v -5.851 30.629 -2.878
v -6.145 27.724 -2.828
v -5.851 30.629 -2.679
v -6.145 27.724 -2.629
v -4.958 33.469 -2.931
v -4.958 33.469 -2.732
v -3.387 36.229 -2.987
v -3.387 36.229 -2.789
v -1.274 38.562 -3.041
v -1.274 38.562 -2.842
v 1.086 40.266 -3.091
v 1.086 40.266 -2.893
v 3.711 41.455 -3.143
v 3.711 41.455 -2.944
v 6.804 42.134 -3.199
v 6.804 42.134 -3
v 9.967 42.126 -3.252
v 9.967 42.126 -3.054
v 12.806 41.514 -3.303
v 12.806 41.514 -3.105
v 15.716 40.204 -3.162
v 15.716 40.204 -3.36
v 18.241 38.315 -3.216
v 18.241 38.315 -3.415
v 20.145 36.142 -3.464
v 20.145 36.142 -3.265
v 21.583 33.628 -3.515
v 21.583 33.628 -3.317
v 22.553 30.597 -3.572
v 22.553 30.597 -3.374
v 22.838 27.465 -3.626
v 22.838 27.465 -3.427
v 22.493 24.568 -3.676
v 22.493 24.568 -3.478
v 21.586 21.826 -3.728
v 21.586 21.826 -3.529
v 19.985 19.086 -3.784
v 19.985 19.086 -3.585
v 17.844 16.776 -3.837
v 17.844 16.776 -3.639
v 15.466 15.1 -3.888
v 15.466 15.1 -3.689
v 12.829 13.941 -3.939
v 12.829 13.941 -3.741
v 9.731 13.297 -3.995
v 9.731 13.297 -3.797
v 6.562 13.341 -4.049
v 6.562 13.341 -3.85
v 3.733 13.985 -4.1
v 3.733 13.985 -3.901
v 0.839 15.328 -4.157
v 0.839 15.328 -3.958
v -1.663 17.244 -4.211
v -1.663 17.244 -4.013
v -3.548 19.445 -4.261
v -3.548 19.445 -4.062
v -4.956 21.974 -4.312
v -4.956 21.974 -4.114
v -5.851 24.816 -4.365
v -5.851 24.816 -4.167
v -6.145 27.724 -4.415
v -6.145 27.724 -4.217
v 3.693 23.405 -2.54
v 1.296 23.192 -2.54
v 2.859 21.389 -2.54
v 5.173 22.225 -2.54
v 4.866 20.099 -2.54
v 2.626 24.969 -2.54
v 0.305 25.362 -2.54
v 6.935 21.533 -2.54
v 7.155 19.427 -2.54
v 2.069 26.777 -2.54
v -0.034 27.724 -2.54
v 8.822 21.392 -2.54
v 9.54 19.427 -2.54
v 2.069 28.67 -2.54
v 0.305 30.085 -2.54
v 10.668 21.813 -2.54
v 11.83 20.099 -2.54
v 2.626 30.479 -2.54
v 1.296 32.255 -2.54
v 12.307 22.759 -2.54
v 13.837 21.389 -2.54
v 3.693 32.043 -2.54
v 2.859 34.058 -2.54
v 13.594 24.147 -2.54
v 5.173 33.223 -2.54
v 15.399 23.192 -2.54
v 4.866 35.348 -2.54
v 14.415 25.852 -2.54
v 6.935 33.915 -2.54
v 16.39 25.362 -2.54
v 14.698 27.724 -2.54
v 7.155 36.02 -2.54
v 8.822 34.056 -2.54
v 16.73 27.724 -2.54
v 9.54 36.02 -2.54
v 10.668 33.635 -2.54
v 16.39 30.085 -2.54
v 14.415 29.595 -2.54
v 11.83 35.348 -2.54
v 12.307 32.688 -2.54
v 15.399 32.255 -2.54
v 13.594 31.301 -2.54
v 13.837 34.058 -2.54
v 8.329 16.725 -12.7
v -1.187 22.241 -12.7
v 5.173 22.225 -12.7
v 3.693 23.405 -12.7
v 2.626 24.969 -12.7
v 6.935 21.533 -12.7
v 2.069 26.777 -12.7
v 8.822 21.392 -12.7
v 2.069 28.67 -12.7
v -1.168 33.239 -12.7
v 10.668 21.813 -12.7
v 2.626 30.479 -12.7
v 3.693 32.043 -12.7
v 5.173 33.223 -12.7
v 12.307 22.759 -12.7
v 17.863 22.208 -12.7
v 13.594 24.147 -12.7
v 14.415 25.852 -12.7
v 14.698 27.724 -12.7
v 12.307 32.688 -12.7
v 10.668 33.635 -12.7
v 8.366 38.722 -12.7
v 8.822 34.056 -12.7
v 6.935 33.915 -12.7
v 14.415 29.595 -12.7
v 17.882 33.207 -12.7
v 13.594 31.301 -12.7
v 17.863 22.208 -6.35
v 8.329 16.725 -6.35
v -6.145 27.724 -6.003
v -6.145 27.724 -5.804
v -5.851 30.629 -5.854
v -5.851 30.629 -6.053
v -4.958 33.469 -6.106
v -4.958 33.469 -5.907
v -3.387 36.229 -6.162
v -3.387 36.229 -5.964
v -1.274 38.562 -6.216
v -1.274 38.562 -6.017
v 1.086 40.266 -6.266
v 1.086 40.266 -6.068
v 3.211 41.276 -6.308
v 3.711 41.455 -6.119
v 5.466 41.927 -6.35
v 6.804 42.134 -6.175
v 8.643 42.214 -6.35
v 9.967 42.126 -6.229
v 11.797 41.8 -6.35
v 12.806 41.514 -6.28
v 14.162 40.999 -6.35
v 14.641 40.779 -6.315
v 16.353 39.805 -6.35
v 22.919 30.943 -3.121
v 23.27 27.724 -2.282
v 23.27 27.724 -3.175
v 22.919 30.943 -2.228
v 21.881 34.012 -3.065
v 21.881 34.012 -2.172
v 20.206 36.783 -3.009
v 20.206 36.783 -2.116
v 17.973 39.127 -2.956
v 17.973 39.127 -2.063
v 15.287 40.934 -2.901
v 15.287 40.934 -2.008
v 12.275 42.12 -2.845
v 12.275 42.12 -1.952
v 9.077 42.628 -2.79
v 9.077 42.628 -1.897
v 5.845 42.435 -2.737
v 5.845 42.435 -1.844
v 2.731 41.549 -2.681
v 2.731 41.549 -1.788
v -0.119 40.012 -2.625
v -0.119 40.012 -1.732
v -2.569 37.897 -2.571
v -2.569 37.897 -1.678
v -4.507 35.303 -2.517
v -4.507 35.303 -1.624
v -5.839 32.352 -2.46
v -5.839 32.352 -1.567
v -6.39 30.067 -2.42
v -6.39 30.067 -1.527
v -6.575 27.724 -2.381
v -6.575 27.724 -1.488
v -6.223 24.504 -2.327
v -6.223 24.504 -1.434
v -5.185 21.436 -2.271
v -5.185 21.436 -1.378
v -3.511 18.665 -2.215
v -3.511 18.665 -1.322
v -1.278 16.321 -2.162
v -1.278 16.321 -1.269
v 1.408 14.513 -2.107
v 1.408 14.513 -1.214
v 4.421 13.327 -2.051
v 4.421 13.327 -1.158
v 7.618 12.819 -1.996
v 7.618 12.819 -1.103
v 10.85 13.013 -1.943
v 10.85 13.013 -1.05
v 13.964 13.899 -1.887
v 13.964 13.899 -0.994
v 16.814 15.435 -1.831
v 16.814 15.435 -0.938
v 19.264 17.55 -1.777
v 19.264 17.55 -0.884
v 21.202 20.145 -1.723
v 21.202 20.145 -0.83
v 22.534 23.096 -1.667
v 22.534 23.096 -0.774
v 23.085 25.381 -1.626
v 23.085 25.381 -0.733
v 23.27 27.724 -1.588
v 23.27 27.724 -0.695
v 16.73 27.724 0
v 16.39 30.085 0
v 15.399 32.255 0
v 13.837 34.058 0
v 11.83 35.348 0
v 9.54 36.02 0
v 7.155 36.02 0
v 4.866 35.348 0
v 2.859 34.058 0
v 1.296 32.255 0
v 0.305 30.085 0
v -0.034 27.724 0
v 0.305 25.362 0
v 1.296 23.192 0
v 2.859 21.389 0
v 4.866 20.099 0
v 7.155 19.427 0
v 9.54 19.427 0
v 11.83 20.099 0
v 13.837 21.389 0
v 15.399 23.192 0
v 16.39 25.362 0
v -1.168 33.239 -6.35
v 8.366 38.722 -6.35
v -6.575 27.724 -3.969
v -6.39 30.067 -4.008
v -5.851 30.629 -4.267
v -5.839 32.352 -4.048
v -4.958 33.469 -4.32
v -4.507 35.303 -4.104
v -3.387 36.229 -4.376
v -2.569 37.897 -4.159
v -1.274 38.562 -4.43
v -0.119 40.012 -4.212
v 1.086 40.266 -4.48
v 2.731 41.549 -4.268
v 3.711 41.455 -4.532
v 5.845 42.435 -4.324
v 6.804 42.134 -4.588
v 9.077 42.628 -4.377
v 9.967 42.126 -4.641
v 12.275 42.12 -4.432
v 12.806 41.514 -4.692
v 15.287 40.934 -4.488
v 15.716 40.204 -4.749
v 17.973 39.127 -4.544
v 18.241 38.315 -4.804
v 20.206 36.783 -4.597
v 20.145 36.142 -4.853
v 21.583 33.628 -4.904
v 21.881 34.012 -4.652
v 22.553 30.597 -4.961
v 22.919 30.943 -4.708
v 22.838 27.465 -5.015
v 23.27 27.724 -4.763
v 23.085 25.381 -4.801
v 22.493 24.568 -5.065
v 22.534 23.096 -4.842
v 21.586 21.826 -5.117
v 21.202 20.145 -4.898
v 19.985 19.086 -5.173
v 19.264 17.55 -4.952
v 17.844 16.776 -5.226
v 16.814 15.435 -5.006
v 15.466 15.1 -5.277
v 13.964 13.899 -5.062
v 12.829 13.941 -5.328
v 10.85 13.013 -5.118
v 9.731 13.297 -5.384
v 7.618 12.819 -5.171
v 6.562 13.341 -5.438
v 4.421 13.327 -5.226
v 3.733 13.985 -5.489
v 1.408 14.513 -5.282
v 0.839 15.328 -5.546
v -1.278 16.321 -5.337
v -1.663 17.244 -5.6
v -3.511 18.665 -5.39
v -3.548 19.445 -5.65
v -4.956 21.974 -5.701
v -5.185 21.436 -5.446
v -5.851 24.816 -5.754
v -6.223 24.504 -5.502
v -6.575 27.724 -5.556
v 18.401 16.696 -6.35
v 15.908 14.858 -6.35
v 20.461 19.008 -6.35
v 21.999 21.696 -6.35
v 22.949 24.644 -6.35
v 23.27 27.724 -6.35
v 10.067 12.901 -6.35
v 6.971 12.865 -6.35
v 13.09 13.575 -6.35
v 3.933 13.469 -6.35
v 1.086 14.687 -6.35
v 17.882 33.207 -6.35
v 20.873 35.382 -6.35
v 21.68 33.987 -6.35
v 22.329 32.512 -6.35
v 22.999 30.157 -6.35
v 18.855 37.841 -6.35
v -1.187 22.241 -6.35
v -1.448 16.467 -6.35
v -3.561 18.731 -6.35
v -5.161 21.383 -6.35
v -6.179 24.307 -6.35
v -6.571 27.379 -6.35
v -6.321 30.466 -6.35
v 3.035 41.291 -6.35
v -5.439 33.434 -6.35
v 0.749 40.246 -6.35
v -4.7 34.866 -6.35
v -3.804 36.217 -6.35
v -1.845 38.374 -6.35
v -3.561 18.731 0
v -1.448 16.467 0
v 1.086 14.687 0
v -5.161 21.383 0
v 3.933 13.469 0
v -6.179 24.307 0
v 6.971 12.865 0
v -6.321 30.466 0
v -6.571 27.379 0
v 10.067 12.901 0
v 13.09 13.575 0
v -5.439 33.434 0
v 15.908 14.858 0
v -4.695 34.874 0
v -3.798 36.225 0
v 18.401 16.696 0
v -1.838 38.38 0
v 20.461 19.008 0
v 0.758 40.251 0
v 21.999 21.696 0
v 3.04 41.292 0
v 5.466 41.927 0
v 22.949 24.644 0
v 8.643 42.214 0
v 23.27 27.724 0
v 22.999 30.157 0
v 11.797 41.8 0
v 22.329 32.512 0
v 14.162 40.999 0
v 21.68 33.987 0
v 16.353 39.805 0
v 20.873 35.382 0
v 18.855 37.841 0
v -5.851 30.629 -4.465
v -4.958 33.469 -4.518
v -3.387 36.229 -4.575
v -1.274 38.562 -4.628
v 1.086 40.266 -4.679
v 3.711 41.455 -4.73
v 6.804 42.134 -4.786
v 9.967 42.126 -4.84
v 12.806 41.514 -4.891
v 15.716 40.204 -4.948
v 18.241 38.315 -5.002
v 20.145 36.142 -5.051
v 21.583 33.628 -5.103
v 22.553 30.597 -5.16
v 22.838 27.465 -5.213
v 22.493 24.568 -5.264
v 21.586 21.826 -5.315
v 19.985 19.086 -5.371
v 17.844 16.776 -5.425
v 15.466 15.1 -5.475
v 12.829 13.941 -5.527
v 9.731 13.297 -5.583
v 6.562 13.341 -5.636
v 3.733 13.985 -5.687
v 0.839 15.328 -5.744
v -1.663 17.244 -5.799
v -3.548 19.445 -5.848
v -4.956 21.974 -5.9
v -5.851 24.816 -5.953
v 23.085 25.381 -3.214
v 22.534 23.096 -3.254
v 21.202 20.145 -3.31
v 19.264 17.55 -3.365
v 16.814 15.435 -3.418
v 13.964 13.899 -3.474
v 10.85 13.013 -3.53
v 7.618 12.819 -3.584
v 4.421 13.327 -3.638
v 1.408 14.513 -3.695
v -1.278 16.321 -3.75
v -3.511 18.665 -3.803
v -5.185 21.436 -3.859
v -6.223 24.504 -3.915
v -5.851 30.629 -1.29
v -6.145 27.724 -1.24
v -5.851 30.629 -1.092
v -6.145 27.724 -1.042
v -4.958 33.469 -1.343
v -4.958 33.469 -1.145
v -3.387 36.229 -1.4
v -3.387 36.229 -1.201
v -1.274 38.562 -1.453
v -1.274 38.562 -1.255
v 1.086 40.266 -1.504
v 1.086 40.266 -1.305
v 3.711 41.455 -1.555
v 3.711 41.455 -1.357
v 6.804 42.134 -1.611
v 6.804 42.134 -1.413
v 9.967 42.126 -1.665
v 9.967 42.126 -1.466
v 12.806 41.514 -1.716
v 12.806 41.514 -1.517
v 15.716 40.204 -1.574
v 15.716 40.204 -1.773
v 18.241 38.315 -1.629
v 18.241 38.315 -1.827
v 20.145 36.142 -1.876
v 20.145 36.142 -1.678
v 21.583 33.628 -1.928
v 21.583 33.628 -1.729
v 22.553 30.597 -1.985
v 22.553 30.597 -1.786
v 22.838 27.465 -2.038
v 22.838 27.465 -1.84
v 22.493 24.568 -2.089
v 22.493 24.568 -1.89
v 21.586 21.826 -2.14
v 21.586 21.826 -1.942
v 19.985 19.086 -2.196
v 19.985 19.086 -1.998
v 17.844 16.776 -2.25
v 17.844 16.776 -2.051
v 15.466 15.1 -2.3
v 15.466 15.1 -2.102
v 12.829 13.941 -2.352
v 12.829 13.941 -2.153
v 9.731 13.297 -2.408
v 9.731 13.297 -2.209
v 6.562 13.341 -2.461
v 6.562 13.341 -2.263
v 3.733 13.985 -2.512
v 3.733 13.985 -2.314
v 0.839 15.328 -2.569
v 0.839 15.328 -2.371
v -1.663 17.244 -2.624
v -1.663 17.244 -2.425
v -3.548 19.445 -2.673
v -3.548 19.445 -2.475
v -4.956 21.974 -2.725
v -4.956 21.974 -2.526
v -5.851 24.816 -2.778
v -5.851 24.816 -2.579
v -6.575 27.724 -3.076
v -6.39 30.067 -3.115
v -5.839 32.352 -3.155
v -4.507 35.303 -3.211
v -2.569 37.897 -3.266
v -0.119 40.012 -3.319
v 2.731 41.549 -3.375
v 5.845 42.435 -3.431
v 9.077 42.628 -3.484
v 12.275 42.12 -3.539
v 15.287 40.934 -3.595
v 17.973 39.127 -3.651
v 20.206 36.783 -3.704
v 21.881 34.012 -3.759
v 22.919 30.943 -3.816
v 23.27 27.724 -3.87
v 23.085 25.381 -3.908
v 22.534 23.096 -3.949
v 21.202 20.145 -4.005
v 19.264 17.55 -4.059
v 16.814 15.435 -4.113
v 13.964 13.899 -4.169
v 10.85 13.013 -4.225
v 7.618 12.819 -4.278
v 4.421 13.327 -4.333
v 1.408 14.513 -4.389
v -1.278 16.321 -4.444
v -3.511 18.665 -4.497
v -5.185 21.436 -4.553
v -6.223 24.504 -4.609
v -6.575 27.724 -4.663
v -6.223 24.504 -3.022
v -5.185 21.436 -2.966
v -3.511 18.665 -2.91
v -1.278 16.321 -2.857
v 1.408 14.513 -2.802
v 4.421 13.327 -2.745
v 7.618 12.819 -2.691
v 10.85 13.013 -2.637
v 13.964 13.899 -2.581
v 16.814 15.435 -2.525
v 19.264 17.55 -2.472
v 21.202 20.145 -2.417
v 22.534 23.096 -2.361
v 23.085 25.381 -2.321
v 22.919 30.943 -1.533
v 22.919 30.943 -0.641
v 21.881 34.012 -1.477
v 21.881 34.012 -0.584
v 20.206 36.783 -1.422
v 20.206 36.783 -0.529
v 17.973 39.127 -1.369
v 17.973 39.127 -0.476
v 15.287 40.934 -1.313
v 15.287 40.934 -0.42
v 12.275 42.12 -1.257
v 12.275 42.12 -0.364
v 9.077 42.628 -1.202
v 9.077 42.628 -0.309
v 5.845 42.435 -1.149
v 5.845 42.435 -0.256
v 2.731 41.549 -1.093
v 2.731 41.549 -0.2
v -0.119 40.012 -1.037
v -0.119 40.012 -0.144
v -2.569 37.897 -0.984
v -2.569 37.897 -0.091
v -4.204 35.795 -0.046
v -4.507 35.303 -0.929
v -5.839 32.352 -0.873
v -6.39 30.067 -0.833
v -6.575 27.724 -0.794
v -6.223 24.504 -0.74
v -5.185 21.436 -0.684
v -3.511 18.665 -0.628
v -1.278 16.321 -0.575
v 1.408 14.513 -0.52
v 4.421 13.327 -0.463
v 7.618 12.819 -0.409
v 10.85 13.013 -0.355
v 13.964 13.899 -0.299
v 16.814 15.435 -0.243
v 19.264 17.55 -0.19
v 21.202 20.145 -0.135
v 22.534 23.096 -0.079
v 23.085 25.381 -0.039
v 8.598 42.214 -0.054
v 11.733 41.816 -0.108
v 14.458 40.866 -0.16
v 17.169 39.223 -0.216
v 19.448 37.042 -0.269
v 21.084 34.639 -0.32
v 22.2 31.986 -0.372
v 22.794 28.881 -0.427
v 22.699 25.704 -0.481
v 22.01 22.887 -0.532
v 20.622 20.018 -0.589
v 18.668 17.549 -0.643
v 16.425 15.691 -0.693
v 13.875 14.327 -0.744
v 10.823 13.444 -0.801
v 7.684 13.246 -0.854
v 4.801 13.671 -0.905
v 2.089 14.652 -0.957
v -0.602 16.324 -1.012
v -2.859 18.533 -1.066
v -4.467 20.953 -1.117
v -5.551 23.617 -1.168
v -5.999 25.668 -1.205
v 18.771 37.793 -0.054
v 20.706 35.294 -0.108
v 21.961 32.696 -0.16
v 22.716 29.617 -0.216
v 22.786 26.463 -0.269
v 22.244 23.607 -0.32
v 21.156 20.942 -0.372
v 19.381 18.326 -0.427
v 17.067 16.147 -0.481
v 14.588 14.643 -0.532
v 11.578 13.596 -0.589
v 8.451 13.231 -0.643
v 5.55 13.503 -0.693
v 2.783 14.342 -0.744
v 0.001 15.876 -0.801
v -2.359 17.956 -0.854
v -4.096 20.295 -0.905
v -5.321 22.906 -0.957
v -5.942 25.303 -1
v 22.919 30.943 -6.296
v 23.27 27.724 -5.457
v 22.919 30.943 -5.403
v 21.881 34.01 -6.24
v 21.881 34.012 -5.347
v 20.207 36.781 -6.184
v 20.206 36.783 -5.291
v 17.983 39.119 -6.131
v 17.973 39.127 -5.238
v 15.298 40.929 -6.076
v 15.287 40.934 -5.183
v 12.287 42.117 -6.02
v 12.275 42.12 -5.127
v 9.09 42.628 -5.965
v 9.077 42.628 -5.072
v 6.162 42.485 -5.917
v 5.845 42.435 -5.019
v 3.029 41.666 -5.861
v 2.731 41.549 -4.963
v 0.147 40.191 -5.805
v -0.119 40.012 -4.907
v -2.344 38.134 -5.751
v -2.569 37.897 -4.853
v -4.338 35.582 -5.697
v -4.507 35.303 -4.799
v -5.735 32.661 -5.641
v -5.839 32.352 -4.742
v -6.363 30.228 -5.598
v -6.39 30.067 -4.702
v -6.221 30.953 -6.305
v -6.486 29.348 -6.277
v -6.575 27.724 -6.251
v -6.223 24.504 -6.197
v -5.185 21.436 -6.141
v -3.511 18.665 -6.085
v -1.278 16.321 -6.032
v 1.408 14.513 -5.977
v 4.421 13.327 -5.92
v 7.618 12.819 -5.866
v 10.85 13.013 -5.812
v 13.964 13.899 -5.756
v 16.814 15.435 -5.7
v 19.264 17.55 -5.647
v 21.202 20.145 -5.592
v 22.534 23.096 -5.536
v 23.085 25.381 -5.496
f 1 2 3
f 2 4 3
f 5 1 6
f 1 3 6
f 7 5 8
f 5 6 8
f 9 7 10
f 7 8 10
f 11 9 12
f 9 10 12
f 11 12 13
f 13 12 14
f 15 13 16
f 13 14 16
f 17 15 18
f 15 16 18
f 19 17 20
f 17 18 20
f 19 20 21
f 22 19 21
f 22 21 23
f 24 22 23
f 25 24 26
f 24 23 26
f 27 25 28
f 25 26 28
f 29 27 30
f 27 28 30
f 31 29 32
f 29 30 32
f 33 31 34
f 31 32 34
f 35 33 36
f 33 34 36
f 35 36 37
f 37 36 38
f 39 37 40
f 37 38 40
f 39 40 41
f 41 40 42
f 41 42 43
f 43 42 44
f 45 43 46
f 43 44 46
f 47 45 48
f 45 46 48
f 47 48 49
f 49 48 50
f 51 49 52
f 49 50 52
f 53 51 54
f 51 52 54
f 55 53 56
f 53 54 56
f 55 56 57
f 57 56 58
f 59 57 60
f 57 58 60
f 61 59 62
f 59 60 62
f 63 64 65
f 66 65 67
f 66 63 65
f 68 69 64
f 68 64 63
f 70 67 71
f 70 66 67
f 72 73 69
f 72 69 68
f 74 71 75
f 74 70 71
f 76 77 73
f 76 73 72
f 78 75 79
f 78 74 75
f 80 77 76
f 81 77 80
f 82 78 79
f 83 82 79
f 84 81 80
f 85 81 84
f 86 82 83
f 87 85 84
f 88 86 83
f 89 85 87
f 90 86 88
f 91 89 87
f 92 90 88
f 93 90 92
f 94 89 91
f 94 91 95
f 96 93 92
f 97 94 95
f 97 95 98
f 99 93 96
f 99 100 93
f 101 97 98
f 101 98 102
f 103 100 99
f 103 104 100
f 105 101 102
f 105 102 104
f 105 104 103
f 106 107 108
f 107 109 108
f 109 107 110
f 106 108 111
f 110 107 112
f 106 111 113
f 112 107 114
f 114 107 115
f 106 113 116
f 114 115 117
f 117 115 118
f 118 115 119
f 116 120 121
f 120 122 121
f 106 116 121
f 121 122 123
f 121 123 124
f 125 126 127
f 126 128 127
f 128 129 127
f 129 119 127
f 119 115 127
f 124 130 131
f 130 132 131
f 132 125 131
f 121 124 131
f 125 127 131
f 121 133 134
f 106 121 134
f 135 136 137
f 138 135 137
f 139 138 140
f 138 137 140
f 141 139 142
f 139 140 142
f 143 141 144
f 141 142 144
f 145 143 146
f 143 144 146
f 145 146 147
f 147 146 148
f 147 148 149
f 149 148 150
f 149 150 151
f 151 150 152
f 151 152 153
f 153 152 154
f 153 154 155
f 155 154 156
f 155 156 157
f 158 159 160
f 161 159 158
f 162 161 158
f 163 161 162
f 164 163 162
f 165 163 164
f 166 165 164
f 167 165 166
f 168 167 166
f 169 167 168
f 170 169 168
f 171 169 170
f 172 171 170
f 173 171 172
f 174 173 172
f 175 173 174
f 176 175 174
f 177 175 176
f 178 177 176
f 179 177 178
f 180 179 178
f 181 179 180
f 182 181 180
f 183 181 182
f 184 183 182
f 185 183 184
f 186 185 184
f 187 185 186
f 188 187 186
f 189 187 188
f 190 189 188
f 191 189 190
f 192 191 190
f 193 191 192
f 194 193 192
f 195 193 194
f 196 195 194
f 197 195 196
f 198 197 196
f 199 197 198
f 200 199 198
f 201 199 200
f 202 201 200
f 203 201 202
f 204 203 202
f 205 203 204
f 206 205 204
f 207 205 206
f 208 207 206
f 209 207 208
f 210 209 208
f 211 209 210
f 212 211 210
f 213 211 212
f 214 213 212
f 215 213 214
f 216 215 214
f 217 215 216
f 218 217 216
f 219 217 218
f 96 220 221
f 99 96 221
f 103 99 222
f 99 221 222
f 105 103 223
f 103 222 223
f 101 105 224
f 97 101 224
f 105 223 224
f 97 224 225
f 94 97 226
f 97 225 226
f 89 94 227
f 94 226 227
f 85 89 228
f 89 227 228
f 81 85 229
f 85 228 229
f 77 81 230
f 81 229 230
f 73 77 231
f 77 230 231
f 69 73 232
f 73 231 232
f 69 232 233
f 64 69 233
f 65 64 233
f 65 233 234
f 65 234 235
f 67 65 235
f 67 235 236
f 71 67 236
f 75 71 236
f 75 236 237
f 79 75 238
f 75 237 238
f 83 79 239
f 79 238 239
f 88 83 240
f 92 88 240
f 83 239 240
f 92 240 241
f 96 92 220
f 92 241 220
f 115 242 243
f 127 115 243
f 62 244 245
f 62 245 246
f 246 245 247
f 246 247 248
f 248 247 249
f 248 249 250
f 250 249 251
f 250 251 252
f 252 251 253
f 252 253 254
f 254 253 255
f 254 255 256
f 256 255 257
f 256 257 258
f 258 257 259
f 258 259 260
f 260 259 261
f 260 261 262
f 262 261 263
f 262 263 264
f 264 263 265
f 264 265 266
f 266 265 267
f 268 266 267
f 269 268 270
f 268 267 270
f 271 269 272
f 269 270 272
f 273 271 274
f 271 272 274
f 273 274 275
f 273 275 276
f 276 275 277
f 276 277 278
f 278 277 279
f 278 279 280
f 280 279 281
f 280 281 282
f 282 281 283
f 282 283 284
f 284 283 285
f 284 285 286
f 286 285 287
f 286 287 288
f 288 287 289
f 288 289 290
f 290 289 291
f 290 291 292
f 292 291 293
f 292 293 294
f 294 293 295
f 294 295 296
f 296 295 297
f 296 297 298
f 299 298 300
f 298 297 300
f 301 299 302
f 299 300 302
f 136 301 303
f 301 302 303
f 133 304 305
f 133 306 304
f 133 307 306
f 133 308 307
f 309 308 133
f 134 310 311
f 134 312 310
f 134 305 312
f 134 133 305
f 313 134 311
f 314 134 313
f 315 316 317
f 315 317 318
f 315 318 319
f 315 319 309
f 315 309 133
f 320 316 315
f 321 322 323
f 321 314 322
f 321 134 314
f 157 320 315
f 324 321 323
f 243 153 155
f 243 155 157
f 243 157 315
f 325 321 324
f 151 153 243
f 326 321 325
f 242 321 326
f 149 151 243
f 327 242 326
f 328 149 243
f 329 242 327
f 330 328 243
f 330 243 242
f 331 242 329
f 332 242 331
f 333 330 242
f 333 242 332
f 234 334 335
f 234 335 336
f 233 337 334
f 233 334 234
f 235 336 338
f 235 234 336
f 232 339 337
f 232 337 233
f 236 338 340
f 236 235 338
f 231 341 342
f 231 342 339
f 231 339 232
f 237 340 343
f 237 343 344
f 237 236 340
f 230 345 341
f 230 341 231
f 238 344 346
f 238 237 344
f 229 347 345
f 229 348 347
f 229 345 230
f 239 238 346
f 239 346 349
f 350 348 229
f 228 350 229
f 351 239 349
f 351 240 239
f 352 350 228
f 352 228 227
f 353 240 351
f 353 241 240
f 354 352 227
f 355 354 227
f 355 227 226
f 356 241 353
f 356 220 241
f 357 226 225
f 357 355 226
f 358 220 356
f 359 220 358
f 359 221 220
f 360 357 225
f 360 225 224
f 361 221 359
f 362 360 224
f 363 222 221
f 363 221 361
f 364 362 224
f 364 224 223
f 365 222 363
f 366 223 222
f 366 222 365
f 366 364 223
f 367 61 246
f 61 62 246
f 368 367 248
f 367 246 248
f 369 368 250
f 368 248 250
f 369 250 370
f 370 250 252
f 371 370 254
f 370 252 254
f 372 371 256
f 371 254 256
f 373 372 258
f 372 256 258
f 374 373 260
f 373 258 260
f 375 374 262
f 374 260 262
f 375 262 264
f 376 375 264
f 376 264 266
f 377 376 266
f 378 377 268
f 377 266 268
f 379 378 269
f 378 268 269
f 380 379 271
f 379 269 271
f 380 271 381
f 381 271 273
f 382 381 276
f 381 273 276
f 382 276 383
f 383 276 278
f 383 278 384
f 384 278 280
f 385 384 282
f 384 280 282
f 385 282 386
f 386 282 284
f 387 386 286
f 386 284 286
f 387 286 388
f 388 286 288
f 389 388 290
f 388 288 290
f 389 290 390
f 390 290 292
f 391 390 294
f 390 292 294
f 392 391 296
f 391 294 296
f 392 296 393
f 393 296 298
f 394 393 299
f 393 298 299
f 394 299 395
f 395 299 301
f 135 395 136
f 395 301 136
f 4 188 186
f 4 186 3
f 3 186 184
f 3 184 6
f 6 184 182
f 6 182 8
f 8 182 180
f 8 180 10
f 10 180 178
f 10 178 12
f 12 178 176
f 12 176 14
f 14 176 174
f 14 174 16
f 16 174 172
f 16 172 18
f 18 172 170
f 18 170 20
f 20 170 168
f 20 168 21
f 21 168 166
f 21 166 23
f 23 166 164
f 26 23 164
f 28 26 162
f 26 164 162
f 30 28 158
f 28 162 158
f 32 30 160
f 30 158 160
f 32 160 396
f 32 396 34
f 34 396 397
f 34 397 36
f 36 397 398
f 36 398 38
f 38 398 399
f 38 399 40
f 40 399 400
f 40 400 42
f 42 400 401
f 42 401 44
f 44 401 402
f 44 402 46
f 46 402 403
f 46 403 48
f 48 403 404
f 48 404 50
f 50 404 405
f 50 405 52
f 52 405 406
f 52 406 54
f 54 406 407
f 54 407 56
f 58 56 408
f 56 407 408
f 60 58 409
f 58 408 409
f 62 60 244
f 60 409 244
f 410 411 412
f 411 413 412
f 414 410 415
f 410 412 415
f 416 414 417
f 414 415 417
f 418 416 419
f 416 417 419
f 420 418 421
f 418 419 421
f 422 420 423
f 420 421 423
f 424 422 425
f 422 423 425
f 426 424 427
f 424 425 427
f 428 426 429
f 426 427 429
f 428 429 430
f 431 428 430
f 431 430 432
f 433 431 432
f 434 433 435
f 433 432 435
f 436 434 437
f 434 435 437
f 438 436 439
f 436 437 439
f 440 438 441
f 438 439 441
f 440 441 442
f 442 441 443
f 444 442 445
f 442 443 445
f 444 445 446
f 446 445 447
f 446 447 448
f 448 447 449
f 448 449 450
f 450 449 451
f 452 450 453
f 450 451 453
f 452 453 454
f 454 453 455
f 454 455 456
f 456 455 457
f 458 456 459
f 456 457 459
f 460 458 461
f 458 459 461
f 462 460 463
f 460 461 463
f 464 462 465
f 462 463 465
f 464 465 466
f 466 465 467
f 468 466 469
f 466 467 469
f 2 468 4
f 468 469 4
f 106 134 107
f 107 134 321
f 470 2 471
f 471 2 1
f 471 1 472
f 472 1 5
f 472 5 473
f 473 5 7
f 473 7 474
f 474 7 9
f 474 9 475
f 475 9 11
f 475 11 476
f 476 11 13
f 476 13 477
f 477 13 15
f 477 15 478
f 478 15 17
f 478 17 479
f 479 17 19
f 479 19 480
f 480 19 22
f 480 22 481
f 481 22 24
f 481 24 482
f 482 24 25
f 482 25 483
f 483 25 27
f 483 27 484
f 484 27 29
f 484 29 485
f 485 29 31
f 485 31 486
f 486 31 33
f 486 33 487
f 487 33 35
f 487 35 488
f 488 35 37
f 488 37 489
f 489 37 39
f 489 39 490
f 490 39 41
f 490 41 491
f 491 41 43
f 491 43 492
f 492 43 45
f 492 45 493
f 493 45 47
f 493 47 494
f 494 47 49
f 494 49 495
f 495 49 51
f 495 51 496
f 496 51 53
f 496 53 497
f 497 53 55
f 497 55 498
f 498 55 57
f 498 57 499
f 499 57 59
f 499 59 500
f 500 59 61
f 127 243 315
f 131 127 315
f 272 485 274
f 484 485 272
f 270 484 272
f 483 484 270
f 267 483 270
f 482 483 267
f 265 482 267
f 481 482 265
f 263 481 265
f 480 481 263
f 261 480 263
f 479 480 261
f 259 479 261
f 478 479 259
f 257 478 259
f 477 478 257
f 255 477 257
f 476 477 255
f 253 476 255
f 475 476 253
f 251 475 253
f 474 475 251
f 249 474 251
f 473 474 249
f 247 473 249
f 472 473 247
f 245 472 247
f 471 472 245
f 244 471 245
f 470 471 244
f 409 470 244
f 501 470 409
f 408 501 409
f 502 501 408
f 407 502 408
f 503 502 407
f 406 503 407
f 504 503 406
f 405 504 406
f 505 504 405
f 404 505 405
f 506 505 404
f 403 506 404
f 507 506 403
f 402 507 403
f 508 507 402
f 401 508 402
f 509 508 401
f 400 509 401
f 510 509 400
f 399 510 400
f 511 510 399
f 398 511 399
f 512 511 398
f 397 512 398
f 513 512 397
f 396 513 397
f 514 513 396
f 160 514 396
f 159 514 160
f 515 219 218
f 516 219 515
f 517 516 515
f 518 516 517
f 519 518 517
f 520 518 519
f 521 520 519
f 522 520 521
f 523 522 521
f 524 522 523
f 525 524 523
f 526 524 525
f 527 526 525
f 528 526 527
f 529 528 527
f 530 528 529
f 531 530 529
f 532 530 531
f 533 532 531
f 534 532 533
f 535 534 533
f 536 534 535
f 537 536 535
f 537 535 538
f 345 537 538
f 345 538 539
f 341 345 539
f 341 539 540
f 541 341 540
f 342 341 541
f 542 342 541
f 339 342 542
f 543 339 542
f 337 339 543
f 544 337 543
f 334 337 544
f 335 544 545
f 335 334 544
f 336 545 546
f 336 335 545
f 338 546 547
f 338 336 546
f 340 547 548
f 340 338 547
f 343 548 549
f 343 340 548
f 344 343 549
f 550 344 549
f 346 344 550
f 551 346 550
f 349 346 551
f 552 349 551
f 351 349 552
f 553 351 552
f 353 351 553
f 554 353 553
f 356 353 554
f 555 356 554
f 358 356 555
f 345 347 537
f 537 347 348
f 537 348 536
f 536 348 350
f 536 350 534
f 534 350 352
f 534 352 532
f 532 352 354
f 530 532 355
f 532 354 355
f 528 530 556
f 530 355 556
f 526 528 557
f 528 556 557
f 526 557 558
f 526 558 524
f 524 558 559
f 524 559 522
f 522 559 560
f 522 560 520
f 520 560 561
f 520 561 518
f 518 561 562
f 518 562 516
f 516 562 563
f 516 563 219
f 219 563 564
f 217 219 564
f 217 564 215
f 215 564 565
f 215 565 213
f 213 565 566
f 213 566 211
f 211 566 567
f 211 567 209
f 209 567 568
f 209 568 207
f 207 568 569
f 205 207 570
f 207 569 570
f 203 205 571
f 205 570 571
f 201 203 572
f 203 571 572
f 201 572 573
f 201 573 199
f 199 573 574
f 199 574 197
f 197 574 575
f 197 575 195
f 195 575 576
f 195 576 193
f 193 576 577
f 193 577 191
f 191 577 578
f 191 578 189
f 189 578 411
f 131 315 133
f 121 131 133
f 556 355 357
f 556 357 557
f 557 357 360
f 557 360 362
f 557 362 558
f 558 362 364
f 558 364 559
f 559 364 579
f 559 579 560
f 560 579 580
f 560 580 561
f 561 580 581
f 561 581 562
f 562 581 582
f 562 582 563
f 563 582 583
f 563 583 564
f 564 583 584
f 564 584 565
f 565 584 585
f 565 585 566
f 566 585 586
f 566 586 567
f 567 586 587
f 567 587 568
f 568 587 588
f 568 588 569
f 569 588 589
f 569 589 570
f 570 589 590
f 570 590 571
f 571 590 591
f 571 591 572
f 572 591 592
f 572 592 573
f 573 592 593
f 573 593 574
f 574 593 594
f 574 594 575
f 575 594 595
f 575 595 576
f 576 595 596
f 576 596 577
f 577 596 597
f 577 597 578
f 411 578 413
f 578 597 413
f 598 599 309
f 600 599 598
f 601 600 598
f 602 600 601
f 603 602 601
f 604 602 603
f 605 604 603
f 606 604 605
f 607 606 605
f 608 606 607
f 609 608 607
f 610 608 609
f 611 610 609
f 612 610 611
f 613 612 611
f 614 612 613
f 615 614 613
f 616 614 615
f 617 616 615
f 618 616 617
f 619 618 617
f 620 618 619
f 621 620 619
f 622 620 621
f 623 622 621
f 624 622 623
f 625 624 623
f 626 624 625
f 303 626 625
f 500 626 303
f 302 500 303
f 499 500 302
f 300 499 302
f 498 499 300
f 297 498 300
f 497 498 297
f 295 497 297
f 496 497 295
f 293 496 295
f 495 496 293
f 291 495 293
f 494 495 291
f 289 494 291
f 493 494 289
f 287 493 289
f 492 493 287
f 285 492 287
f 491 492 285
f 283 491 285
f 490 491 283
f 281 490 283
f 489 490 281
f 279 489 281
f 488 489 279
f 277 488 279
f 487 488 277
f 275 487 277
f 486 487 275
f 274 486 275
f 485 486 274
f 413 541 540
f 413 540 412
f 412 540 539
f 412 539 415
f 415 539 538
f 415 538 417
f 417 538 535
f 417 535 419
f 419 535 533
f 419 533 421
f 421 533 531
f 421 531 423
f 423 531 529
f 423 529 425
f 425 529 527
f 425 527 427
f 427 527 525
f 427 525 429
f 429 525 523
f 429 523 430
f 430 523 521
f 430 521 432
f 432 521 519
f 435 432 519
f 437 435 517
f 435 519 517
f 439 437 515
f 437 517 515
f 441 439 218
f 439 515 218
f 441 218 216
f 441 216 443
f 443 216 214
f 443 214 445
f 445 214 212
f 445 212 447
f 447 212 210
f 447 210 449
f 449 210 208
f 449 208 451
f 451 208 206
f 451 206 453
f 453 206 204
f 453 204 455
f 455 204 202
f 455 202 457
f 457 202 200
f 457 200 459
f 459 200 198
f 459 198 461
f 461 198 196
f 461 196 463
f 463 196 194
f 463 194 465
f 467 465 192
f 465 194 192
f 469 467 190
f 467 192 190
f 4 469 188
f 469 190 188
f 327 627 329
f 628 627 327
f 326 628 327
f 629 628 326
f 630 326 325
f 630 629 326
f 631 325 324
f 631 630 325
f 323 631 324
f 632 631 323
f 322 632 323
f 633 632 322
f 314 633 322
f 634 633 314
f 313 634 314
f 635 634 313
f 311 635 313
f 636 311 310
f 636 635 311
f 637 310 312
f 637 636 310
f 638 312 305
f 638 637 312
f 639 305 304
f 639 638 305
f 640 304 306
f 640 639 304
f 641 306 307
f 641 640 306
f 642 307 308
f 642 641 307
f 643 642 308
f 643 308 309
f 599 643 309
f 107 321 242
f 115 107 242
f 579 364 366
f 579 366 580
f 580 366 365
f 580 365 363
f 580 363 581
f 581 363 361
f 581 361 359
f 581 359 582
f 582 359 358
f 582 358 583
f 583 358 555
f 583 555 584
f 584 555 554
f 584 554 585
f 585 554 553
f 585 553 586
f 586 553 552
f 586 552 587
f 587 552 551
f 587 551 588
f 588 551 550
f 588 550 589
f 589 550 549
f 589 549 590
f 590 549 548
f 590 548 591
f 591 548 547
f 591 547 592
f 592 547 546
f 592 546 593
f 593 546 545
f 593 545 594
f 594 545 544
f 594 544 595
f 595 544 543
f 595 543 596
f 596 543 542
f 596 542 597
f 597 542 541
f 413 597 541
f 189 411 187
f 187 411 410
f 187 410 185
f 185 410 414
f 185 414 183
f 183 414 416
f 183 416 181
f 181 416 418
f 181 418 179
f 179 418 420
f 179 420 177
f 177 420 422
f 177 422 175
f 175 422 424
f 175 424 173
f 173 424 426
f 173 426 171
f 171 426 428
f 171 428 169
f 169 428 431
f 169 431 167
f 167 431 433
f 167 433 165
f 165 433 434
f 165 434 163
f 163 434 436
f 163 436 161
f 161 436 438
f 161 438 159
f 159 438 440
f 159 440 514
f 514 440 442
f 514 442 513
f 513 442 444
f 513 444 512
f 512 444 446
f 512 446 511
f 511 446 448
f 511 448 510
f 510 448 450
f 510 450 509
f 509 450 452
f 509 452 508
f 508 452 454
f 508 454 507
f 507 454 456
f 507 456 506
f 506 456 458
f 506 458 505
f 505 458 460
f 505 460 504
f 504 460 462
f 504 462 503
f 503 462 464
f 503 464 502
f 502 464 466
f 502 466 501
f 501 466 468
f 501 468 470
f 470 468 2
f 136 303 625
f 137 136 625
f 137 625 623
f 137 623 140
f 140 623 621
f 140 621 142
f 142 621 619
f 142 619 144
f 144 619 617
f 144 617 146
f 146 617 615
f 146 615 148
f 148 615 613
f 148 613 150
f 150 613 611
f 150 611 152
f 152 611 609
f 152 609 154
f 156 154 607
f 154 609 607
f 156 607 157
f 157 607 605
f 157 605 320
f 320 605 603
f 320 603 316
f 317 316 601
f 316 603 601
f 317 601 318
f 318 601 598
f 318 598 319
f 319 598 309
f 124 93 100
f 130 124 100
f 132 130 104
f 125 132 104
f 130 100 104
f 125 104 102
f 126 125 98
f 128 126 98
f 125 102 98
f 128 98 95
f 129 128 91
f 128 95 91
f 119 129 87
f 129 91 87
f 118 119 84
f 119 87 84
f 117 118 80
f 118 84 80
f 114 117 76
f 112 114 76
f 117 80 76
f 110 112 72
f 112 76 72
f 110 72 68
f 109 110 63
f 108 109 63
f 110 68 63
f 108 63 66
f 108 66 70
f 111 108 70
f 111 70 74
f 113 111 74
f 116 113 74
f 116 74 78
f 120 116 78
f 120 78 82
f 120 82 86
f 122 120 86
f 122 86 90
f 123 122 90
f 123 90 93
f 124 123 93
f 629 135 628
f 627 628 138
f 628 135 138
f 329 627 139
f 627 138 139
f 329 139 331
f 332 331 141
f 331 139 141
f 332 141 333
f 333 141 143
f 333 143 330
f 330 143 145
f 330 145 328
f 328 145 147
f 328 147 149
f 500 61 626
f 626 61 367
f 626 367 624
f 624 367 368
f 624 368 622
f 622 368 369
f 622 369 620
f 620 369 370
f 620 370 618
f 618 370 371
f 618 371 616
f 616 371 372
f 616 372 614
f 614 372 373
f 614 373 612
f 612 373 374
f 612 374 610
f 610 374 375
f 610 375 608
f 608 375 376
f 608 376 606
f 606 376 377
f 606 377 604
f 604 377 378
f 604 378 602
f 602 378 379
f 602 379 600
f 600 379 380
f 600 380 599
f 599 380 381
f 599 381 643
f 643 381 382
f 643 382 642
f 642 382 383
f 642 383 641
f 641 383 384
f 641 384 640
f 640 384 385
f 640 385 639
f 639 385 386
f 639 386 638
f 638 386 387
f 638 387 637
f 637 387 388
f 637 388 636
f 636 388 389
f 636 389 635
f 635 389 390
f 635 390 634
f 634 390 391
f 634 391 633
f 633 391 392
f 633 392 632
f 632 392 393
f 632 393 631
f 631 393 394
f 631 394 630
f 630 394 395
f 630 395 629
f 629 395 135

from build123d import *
from build123d.topology import SkipClean

# Parameters (mm, degrees)
SKETCH3_R           = 14.9225
BOSS_EXTRUDE1_DEPTH = 12.7
SKETCH11_R          = 6.35
CUT_EXTRUDE3_DEPTH  = 12.7
SKETCH12_R          = 8.382
CUT_EXTRUDE4_DEPTH  = 2.54
THREAD1_PITCH       = 1.5875
CUT_EXTRUDE6_START  = -6.35
SKETCH14_R          = 14.9225
CUT_EXTRUDE6_DEPTH  = 6.35


with BuildPart() as part:
    # Sketch3 → Boss-Extrude1 (new body)
    with BuildSketch(Plane.XY):
        with Locations((8.347593151, 27.723781851)):
            Circle(SKETCH3_R)
    extrude(amount=-BOSS_EXTRUDE1_DEPTH)

    # Sketch11 → Cut-Extrude3 (cut)
    with BuildSketch(Plane.XY):
        with Locations((8.347593151, 27.723781851)):
            Circle(SKETCH11_R)
    extrude(amount=-CUT_EXTRUDE3_DEPTH, mode=Mode.SUBTRACT)

    # Sketch12 → Cut-Extrude4 (cut)
    with BuildSketch(Plane.XY):
        with Locations((8.347593151, 27.723781851)):
            Circle(SKETCH12_R)
    extrude(amount=-CUT_EXTRUDE4_DEPTH, mode=Mode.SUBTRACT)

    # Thread1: the profile of Thread Profile1 profile screwed along a right-hand helix of 4.8 turns, 8 arcs to a turn; built about Z, then put on its axis
    thread1_z = Axis((0, 0, 0), (0, 0, 1))
    thread1_corners = [(14.9228, 0, -0.000173205), (14.9228, 0, 0.694704453), (14.492870212, 0, 0.446484374), (14.492870212, 0, 0.248046874)]
    with BuildLine(mode=Mode.PRIVATE) as thread1_profile:
        Line(thread1_corners[0], thread1_corners[1])
        Line(thread1_corners[1], thread1_corners[2])
        Line(thread1_corners[2], thread1_corners[3])
        Line(thread1_corners[3], thread1_corners[0])
    thread1_cap = Face(thread1_profile.wire())
    thread1_turn_angles = [0, 22.5, 45, 67.5, 90, 112.5, 135, 157.5, 180, 202.5, 225, 247.5, 270, 292.5, 315, 337.5, 360]
    thread1_turn_weights = [1, 0.9238795325112867, 1, 0.9238795325112867, 1, 0.9238795325112867, 1, 0.9238795325112867, 1, 0.9238795325112867, 1, 0.9238795325112867, 1, 0.9238795325112867, 1, 0.9238795325112867, 1]
    thread1_turn_rails = [Edge.make_bspline([Vector(p[0], p[1], 0).rotate(thread1_z, thread1_turn_angles[k]) / thread1_turn_weights[k] + Vector(0, 0, p[2] + THREAD1_PITCH * thread1_turn_angles[k] / 360) for k in range(17)], [0, 0, 0, 1, 1, 2, 2, 3, 3, 4, 4, 5, 5, 6, 6, 7, 7, 8, 8, 8], 2, thread1_turn_weights) for p in thread1_corners]
    thread1_turn_sides = [Face.make_surface_from_curves(thread1_turn_rails[p[0]], thread1_turn_rails[p[1]]) for p in [(0, 1), (1, 2), (2, 3), (3, 0)]]
    thread1_last_angles = [1440, 1462.5, 1485, 1507.5, 1530, 1552.5, 1575, 1597.5, 1620, 1642.5, 1665, 1687.5, 1710, 1719, 1728]
    thread1_last_weights = [1, 0.9238795325112867, 1, 0.9238795325112867, 1, 0.9238795325112867, 1, 0.9238795325112867, 1, 0.9238795325112867, 1, 0.9238795325112867, 1, 0.9876883405951378, 1]
    thread1_last_rails = [Edge.make_bspline([Vector(p[0], p[1], 0).rotate(thread1_z, thread1_last_angles[k]) / thread1_last_weights[k] + Vector(0, 0, p[2] + THREAD1_PITCH * thread1_last_angles[k] / 360) for k in range(15)], [0, 0, 0, 1, 1, 2, 2, 3, 3, 4, 4, 5, 5, 6, 6, 7, 7, 7], 2, thread1_last_weights) for p in thread1_corners]
    thread1_last_sides = [Face.make_surface_from_curves(thread1_last_rails[p[0]], thread1_last_rails[p[1]]) for p in [(0, 1), (1, 2), (2, 3), (3, 0)]]
    thread1 = Plane(origin=(8.347593151, 27.723781851, 0.79375), x_dir=(-1, 0, 0), z_dir=(0, 0, -1)) * Solid(Shell([*[p.moved(Location((0, 0, THREAD1_PITCH * i))) for i in range(4) for p in thread1_turn_sides], *thread1_last_sides, thread1_cap, thread1_cap.rotate(thread1_z, 1728).moved(Location((0, 0, THREAD1_PITCH * 1728 / 360)))]))
    add(thread1, mode=Mode.SUBTRACT)

    # Sketch14 → Cut-Extrude6 (cut)
    with SkipClean():  # the faces are left unmerged after this step: merging them gives an invalid solid
        with BuildSketch(Plane(origin=(0, 0, -12.7), x_dir=(-1, 0, 0), z_dir=(0, 0, -1)).offset(CUT_EXTRUDE6_START)):
            with Locations((-8.347593151, 27.723781851)):
                Circle(SKETCH14_R)
            Polygon((1.186658464, 22.240576024), (1.168128197, 33.239083042), (-8.366123418, 38.722288869), (-17.881844766, 33.206987678), (-17.863314499, 22.20848066), (-8.329062884, 16.725274833), align=None, mode=Mode.SUBTRACT)
        extrude(amount=CUT_EXTRUDE6_DEPTH, mode=Mode.SUBTRACT)
    add(part.part.scale(1), mode=Mode.REPLACE)  # the faces are merged on a copy


solid = part.part
